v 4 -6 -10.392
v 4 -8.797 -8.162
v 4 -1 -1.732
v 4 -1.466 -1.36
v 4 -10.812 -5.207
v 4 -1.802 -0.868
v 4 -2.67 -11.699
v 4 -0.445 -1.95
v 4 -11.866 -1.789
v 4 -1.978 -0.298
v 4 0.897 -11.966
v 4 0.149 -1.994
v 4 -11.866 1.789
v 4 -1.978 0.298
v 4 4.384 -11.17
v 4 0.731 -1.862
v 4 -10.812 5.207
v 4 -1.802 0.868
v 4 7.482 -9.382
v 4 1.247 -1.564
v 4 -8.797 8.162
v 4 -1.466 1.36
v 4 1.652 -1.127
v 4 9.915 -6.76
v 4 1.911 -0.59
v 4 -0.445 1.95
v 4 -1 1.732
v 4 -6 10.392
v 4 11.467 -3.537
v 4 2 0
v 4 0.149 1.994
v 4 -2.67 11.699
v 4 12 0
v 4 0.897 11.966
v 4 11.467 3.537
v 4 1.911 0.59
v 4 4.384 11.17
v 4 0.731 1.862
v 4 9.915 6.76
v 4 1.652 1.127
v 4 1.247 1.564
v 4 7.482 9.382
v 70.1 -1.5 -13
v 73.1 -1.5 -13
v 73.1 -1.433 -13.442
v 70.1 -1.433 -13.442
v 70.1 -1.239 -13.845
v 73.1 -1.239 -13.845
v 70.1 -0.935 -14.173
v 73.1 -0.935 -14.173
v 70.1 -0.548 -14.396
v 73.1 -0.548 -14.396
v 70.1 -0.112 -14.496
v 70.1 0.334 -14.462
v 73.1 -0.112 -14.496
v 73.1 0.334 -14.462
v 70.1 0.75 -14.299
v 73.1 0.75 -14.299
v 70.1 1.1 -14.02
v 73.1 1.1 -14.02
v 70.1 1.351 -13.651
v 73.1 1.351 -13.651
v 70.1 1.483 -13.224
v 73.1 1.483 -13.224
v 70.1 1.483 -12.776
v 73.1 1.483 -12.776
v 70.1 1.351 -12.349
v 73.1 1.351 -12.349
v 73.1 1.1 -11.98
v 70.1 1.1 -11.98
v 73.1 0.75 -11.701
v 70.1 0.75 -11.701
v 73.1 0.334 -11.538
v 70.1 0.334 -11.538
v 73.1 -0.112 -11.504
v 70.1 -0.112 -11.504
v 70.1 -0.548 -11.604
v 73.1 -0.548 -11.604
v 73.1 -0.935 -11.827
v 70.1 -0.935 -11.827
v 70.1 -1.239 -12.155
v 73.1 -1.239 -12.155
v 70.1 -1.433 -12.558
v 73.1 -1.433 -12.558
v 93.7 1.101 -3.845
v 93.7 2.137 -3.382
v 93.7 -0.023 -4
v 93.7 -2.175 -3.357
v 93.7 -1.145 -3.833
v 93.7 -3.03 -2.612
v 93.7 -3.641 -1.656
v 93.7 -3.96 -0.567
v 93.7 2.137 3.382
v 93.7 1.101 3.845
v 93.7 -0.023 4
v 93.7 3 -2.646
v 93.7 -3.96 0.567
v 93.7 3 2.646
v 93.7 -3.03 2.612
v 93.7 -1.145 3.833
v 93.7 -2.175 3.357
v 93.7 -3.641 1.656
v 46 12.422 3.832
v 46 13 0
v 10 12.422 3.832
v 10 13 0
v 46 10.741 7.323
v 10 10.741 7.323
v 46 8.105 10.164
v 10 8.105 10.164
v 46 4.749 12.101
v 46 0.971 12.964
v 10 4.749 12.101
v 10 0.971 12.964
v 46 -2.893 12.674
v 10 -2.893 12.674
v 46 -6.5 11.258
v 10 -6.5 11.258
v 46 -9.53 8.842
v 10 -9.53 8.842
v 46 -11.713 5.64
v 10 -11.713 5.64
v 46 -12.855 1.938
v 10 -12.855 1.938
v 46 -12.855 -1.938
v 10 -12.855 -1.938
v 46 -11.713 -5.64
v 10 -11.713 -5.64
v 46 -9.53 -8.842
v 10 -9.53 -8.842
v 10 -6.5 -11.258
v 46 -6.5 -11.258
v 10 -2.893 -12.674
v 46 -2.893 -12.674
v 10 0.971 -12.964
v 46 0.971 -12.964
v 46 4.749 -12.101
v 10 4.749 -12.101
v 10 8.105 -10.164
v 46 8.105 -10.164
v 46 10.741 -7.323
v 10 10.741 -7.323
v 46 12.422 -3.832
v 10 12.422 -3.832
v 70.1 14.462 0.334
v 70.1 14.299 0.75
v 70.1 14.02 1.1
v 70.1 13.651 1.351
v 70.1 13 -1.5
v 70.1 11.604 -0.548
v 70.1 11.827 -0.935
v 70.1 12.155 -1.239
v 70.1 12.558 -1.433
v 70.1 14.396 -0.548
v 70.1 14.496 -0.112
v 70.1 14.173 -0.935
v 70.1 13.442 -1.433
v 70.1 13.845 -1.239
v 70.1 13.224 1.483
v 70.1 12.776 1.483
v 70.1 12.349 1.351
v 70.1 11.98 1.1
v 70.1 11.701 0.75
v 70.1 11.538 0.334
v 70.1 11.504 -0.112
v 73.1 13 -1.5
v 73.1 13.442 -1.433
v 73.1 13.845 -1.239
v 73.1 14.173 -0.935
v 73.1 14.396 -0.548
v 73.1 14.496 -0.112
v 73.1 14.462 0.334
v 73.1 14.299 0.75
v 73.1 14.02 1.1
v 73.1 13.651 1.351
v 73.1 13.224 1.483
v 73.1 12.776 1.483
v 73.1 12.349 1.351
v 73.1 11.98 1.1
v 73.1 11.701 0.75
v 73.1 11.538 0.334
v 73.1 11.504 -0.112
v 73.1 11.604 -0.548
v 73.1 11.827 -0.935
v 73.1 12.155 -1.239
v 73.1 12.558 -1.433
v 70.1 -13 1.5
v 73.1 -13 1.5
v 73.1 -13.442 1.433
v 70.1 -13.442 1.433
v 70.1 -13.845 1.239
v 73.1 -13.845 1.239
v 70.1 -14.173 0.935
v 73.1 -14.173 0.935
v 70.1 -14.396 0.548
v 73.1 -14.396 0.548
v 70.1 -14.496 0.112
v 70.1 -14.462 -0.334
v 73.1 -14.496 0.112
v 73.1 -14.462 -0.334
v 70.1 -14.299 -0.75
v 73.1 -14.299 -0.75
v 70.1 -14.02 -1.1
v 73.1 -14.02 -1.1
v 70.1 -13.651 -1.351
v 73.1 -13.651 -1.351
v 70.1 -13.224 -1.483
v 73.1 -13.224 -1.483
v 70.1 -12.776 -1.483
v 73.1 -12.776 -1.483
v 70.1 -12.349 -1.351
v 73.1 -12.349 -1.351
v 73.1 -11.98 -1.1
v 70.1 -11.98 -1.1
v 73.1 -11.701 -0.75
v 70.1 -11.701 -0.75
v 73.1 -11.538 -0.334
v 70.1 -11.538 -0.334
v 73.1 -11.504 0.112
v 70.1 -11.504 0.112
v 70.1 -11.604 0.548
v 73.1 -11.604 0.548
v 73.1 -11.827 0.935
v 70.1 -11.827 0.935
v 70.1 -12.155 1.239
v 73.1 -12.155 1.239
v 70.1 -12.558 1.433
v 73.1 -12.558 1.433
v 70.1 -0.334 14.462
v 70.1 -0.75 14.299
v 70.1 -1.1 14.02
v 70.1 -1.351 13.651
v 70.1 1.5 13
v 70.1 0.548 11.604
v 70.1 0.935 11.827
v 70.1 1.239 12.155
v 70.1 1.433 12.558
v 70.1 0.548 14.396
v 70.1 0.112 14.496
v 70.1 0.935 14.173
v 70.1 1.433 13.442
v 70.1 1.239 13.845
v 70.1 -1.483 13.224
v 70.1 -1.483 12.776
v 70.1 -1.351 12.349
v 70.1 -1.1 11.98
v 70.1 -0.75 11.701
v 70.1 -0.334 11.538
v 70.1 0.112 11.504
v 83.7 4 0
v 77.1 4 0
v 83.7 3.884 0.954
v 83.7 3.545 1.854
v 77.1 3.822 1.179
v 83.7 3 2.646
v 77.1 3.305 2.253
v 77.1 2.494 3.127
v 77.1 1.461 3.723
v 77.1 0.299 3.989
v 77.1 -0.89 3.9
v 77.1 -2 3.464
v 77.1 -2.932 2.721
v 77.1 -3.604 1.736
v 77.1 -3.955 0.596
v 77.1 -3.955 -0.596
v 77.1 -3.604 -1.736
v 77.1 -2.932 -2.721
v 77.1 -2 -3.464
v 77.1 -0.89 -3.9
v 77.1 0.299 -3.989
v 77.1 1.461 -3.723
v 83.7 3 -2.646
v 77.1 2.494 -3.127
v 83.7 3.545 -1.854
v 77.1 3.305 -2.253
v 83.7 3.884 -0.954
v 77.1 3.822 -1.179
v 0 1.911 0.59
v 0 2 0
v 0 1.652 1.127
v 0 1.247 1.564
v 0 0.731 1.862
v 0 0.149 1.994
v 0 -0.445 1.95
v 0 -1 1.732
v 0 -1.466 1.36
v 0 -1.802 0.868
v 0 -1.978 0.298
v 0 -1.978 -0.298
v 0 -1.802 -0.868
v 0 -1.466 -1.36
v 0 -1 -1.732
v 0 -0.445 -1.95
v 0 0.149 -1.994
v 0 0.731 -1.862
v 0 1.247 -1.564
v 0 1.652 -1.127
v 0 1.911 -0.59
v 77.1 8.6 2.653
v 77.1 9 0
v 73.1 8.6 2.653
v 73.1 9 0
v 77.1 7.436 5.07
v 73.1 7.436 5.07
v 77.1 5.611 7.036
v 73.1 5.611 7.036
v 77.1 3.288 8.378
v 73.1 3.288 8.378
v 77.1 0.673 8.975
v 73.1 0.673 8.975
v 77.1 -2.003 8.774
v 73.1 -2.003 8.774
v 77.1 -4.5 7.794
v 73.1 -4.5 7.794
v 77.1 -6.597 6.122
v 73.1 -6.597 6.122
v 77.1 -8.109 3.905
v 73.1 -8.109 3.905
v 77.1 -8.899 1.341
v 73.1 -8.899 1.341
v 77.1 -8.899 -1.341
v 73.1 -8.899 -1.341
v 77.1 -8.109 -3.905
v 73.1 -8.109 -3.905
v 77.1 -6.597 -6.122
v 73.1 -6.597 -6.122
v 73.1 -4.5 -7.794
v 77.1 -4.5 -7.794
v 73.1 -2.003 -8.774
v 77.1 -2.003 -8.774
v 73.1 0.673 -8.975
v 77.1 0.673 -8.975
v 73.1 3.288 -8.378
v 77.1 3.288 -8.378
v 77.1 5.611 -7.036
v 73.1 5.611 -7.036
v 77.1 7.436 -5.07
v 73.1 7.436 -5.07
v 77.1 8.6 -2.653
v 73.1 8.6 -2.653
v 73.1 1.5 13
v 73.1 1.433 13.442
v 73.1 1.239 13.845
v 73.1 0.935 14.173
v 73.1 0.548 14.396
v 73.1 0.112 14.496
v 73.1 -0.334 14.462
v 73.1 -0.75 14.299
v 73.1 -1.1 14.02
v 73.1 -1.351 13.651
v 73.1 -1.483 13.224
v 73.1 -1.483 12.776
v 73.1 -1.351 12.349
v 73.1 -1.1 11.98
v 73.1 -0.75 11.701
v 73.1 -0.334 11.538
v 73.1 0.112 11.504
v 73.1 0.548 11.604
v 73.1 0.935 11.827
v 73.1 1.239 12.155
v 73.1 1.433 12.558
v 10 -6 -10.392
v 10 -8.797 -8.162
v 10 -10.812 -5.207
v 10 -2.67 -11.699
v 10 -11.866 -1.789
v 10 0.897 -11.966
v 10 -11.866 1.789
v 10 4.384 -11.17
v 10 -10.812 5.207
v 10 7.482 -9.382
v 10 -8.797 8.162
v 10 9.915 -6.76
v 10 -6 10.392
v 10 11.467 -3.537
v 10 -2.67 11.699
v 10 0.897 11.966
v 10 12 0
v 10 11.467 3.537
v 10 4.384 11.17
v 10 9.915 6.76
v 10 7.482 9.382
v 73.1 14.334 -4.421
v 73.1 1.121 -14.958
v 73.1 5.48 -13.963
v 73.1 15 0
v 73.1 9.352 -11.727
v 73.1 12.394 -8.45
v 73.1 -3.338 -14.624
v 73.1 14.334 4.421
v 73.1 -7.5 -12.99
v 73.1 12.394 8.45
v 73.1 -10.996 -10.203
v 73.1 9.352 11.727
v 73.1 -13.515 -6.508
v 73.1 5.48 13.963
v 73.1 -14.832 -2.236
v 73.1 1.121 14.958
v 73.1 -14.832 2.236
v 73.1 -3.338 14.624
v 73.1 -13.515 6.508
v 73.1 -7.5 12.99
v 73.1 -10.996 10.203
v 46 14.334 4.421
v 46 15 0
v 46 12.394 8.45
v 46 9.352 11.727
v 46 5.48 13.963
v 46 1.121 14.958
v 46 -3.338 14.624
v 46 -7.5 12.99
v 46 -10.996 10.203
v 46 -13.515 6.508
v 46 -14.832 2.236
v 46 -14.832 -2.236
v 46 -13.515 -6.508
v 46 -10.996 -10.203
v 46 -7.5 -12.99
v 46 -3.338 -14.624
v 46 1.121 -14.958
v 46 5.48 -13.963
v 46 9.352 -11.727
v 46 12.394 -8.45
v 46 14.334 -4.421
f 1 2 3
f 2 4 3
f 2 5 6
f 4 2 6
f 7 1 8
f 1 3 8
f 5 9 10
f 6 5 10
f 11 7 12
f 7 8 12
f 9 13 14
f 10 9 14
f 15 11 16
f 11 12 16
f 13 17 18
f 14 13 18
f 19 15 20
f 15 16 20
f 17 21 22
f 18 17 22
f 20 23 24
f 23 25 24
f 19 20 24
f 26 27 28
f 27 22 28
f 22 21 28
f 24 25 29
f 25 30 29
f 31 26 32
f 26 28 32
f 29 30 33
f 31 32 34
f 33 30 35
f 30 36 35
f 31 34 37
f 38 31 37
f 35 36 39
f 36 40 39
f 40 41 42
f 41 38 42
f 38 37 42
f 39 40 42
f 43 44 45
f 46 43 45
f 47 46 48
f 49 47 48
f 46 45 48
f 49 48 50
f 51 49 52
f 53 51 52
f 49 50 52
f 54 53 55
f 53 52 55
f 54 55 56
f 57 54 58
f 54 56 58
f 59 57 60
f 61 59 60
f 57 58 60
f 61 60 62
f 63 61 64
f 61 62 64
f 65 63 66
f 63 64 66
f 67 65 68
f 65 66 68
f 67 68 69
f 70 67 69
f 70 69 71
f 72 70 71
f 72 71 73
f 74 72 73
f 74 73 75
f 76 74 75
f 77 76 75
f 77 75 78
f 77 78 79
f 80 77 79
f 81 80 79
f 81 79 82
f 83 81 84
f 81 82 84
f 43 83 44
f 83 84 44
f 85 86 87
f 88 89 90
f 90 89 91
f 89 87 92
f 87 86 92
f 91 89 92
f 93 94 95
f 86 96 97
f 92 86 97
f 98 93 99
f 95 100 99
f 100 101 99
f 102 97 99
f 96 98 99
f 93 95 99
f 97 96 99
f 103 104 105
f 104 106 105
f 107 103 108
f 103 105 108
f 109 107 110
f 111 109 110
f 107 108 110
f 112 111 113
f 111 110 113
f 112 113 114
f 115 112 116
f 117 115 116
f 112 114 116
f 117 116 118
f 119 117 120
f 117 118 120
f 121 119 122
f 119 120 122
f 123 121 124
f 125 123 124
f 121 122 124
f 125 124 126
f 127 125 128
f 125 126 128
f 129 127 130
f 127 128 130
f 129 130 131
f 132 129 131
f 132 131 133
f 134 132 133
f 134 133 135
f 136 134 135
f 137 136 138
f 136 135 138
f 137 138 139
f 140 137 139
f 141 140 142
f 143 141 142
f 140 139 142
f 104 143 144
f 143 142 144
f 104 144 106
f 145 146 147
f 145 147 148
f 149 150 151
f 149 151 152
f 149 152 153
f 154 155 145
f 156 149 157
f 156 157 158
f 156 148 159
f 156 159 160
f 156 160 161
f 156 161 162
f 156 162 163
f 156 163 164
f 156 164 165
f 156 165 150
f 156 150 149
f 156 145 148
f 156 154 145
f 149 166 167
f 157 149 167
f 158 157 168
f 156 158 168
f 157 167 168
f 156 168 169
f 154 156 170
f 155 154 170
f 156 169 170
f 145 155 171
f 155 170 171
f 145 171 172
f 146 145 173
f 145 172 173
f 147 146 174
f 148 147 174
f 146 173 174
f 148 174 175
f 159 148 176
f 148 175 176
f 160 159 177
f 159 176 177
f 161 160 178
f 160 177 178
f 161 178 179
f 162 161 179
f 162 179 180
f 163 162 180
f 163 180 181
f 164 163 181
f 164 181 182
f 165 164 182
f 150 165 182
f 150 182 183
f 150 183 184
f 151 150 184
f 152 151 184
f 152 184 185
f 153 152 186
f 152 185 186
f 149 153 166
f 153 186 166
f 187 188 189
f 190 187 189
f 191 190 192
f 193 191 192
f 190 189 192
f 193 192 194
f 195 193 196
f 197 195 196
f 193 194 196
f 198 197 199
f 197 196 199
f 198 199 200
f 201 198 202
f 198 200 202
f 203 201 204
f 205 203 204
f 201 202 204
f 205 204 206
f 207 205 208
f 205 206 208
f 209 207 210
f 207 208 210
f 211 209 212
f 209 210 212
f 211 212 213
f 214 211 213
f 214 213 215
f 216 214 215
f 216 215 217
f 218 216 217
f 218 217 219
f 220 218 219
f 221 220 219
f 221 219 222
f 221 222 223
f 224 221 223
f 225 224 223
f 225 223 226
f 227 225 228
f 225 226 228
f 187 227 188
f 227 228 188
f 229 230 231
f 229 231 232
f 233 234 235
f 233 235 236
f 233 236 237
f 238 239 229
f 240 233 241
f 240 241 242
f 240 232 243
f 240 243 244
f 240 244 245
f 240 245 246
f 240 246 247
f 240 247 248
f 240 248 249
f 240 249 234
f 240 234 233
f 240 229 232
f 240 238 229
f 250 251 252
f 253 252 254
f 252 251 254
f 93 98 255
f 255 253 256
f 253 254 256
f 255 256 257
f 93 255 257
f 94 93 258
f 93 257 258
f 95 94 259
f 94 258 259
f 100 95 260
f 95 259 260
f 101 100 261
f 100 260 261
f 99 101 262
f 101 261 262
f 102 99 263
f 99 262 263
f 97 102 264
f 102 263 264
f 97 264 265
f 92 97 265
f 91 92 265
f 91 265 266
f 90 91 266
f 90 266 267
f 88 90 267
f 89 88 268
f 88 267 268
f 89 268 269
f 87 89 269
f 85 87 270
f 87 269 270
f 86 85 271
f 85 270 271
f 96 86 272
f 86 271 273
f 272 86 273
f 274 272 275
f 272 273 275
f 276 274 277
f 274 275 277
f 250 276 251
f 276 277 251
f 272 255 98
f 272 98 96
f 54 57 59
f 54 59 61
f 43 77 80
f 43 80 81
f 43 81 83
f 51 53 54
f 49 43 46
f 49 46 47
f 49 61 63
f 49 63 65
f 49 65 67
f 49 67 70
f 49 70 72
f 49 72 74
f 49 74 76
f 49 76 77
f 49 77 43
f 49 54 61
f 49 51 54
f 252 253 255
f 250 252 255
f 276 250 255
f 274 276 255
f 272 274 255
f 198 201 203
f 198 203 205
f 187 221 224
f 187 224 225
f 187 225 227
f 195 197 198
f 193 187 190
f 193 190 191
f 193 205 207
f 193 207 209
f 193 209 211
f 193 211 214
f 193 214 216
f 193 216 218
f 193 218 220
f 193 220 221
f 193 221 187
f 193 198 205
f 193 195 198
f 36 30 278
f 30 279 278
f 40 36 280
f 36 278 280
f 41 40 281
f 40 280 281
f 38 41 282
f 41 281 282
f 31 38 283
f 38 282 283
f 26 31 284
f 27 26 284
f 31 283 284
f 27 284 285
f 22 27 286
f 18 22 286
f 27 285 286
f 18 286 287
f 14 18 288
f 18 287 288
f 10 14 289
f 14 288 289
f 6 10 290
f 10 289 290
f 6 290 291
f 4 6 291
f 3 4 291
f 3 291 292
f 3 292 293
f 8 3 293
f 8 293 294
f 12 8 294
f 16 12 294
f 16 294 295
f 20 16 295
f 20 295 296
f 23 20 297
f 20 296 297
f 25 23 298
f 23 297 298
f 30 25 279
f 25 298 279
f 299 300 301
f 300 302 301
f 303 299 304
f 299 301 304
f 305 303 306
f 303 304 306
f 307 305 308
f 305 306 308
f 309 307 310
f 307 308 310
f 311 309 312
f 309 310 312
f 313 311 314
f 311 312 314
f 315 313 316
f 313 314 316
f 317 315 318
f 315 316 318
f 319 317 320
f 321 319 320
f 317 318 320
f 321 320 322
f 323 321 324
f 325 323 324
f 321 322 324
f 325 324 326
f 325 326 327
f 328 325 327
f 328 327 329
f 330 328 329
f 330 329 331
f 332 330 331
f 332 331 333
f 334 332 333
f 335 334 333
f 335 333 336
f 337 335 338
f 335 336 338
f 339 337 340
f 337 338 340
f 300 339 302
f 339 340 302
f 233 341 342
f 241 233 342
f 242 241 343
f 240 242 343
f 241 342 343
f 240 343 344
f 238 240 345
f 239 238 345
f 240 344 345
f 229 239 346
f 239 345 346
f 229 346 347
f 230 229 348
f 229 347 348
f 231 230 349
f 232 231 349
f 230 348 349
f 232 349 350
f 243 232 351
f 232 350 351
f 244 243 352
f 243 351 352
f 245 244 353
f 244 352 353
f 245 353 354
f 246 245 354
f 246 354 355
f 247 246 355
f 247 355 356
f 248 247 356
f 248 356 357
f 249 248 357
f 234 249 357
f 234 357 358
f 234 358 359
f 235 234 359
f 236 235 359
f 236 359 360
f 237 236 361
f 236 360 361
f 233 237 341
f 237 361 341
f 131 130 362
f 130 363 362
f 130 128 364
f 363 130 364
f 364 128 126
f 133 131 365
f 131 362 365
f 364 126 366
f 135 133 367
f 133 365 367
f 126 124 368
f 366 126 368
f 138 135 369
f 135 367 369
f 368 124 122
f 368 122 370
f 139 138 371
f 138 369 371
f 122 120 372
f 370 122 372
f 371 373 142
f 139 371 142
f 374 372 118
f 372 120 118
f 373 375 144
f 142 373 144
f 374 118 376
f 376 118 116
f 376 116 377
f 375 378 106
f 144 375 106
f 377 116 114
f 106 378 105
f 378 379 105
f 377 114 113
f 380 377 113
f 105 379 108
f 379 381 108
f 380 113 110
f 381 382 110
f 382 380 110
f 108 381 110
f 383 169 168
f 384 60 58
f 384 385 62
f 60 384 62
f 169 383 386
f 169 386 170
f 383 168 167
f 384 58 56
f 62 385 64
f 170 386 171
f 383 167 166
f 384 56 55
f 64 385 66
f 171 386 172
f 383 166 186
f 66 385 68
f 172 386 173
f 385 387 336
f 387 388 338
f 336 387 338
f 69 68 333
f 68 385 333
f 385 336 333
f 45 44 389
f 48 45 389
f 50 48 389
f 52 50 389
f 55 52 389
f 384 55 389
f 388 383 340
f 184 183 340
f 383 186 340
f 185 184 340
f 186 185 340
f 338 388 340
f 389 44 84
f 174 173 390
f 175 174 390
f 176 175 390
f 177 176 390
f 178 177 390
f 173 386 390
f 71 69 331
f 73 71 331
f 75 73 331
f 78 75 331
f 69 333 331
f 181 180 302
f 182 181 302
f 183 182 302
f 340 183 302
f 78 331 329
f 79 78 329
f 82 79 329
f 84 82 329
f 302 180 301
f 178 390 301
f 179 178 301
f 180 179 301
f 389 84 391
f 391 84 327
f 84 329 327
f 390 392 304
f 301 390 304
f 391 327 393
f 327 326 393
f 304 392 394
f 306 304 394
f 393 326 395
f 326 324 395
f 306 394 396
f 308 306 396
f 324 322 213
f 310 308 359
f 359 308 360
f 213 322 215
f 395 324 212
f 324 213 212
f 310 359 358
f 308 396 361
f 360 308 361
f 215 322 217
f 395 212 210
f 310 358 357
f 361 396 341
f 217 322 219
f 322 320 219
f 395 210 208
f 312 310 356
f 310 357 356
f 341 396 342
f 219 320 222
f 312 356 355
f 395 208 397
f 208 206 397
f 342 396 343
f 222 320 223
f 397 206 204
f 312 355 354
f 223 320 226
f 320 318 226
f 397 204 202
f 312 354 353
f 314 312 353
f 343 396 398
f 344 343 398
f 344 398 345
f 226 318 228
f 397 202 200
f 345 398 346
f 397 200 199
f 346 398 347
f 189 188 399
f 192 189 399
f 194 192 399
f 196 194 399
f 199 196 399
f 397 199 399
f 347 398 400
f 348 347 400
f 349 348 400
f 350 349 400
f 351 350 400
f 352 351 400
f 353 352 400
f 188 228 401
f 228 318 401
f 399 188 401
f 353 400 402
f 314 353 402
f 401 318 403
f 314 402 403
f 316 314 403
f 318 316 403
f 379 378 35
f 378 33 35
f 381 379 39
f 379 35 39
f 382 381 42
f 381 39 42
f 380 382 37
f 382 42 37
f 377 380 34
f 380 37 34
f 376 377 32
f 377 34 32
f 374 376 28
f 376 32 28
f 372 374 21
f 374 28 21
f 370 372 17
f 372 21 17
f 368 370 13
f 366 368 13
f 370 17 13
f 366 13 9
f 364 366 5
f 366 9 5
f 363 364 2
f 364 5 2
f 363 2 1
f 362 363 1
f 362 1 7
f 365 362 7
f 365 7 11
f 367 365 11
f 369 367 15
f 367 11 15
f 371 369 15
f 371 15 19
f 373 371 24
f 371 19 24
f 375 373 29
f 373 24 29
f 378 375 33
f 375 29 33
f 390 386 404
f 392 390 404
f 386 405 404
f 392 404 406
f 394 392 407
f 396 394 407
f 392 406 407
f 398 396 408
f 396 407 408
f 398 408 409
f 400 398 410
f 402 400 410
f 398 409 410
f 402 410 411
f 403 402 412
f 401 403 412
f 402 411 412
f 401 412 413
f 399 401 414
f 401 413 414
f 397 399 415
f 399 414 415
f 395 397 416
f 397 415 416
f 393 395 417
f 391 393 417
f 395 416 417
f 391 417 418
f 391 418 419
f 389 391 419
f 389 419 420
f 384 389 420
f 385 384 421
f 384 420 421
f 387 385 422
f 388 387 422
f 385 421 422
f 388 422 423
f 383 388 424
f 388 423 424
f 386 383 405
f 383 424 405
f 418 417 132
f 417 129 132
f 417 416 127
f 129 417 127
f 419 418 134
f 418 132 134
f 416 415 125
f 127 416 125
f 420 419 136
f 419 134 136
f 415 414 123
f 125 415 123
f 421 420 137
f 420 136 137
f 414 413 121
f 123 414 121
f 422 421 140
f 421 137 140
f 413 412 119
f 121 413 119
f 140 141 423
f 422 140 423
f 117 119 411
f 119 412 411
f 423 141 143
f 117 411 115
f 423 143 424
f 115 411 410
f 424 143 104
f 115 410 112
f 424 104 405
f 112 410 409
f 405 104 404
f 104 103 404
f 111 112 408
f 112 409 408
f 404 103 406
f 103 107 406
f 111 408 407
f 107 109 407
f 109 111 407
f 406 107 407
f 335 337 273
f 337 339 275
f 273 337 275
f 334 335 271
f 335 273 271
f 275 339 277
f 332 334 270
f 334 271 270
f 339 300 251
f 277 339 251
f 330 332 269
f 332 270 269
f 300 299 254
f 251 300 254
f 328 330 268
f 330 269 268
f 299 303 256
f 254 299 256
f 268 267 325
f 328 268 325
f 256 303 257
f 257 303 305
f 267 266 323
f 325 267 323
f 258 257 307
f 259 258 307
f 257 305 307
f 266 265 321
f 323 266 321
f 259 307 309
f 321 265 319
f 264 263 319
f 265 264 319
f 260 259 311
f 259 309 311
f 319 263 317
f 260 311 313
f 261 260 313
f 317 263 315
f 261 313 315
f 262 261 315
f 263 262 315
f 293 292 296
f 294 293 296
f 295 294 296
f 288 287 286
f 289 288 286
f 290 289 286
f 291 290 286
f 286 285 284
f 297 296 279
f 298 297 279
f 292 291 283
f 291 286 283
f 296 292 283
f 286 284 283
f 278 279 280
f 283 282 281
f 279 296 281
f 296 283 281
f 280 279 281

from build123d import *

# Parameters (mm, degrees)
ESQUISSE2_W             = 5.291502622
ESQUISSE2_H             = 1
ENL_V_MAT_EXTRU_1_DEPTH = 10
ESQUISSE3_R             = 1.5
FIXHOLES_DEPTH          = 3
REPEATFIXHOLES_COUNT    = 4


with BuildPart() as part:
    # Esquisse1 → MainRevolution (revolve)
    with BuildSketch(Plane.XY):
        Polygon((0, 0), (93.7, 0), (93.7, 4), (77.1, 4), (77.1, 9), (73.1, 9), (73.1, 15), (46, 15), (46, 13), (10, 13), (10, 12), (4, 12), (4, 2), (0, 2), align=None)
    revolve(axis=Axis((0, 0, 0), (1, 0, 0)))

    # Esquisse2 → Enlèv. mat.-Extru.1 (cut)
    with BuildSketch(Plane(origin=(93.7, 0, 0), x_dir=(0, 0, -1), z_dir=(1, 0, 0))):
        with Locations((0, 3.5)):
            Rectangle(ESQUISSE2_W, ESQUISSE2_H)
    extrude(amount=-ENL_V_MAT_EXTRU_1_DEPTH, mode=Mode.SUBTRACT)

    # Esquisse3 → FixHoles (cut)
    with BuildSketch(Plane(origin=(73.1, 0, 0), x_dir=(0, 0, -1), z_dir=(1, 0, 0))):
        with Locations((0, 13)):
            Circle(ESQUISSE3_R)
    fixholes = extrude(amount=-FIXHOLES_DEPTH, mode=Mode.SUBTRACT)

    # RepeatFixHoles: FixHoles ×4 about axis
    repeatfixholes_axis = Axis((-5.325, 0, 0), (1, 0, 0))
    for i in range(1, REPEATFIXHOLES_COUNT):
        add(fixholes.rotate(repeatfixholes_axis, i * 360 / REPEATFIXHOLES_COUNT), mode=Mode.SUBTRACT)


solid = part.part
